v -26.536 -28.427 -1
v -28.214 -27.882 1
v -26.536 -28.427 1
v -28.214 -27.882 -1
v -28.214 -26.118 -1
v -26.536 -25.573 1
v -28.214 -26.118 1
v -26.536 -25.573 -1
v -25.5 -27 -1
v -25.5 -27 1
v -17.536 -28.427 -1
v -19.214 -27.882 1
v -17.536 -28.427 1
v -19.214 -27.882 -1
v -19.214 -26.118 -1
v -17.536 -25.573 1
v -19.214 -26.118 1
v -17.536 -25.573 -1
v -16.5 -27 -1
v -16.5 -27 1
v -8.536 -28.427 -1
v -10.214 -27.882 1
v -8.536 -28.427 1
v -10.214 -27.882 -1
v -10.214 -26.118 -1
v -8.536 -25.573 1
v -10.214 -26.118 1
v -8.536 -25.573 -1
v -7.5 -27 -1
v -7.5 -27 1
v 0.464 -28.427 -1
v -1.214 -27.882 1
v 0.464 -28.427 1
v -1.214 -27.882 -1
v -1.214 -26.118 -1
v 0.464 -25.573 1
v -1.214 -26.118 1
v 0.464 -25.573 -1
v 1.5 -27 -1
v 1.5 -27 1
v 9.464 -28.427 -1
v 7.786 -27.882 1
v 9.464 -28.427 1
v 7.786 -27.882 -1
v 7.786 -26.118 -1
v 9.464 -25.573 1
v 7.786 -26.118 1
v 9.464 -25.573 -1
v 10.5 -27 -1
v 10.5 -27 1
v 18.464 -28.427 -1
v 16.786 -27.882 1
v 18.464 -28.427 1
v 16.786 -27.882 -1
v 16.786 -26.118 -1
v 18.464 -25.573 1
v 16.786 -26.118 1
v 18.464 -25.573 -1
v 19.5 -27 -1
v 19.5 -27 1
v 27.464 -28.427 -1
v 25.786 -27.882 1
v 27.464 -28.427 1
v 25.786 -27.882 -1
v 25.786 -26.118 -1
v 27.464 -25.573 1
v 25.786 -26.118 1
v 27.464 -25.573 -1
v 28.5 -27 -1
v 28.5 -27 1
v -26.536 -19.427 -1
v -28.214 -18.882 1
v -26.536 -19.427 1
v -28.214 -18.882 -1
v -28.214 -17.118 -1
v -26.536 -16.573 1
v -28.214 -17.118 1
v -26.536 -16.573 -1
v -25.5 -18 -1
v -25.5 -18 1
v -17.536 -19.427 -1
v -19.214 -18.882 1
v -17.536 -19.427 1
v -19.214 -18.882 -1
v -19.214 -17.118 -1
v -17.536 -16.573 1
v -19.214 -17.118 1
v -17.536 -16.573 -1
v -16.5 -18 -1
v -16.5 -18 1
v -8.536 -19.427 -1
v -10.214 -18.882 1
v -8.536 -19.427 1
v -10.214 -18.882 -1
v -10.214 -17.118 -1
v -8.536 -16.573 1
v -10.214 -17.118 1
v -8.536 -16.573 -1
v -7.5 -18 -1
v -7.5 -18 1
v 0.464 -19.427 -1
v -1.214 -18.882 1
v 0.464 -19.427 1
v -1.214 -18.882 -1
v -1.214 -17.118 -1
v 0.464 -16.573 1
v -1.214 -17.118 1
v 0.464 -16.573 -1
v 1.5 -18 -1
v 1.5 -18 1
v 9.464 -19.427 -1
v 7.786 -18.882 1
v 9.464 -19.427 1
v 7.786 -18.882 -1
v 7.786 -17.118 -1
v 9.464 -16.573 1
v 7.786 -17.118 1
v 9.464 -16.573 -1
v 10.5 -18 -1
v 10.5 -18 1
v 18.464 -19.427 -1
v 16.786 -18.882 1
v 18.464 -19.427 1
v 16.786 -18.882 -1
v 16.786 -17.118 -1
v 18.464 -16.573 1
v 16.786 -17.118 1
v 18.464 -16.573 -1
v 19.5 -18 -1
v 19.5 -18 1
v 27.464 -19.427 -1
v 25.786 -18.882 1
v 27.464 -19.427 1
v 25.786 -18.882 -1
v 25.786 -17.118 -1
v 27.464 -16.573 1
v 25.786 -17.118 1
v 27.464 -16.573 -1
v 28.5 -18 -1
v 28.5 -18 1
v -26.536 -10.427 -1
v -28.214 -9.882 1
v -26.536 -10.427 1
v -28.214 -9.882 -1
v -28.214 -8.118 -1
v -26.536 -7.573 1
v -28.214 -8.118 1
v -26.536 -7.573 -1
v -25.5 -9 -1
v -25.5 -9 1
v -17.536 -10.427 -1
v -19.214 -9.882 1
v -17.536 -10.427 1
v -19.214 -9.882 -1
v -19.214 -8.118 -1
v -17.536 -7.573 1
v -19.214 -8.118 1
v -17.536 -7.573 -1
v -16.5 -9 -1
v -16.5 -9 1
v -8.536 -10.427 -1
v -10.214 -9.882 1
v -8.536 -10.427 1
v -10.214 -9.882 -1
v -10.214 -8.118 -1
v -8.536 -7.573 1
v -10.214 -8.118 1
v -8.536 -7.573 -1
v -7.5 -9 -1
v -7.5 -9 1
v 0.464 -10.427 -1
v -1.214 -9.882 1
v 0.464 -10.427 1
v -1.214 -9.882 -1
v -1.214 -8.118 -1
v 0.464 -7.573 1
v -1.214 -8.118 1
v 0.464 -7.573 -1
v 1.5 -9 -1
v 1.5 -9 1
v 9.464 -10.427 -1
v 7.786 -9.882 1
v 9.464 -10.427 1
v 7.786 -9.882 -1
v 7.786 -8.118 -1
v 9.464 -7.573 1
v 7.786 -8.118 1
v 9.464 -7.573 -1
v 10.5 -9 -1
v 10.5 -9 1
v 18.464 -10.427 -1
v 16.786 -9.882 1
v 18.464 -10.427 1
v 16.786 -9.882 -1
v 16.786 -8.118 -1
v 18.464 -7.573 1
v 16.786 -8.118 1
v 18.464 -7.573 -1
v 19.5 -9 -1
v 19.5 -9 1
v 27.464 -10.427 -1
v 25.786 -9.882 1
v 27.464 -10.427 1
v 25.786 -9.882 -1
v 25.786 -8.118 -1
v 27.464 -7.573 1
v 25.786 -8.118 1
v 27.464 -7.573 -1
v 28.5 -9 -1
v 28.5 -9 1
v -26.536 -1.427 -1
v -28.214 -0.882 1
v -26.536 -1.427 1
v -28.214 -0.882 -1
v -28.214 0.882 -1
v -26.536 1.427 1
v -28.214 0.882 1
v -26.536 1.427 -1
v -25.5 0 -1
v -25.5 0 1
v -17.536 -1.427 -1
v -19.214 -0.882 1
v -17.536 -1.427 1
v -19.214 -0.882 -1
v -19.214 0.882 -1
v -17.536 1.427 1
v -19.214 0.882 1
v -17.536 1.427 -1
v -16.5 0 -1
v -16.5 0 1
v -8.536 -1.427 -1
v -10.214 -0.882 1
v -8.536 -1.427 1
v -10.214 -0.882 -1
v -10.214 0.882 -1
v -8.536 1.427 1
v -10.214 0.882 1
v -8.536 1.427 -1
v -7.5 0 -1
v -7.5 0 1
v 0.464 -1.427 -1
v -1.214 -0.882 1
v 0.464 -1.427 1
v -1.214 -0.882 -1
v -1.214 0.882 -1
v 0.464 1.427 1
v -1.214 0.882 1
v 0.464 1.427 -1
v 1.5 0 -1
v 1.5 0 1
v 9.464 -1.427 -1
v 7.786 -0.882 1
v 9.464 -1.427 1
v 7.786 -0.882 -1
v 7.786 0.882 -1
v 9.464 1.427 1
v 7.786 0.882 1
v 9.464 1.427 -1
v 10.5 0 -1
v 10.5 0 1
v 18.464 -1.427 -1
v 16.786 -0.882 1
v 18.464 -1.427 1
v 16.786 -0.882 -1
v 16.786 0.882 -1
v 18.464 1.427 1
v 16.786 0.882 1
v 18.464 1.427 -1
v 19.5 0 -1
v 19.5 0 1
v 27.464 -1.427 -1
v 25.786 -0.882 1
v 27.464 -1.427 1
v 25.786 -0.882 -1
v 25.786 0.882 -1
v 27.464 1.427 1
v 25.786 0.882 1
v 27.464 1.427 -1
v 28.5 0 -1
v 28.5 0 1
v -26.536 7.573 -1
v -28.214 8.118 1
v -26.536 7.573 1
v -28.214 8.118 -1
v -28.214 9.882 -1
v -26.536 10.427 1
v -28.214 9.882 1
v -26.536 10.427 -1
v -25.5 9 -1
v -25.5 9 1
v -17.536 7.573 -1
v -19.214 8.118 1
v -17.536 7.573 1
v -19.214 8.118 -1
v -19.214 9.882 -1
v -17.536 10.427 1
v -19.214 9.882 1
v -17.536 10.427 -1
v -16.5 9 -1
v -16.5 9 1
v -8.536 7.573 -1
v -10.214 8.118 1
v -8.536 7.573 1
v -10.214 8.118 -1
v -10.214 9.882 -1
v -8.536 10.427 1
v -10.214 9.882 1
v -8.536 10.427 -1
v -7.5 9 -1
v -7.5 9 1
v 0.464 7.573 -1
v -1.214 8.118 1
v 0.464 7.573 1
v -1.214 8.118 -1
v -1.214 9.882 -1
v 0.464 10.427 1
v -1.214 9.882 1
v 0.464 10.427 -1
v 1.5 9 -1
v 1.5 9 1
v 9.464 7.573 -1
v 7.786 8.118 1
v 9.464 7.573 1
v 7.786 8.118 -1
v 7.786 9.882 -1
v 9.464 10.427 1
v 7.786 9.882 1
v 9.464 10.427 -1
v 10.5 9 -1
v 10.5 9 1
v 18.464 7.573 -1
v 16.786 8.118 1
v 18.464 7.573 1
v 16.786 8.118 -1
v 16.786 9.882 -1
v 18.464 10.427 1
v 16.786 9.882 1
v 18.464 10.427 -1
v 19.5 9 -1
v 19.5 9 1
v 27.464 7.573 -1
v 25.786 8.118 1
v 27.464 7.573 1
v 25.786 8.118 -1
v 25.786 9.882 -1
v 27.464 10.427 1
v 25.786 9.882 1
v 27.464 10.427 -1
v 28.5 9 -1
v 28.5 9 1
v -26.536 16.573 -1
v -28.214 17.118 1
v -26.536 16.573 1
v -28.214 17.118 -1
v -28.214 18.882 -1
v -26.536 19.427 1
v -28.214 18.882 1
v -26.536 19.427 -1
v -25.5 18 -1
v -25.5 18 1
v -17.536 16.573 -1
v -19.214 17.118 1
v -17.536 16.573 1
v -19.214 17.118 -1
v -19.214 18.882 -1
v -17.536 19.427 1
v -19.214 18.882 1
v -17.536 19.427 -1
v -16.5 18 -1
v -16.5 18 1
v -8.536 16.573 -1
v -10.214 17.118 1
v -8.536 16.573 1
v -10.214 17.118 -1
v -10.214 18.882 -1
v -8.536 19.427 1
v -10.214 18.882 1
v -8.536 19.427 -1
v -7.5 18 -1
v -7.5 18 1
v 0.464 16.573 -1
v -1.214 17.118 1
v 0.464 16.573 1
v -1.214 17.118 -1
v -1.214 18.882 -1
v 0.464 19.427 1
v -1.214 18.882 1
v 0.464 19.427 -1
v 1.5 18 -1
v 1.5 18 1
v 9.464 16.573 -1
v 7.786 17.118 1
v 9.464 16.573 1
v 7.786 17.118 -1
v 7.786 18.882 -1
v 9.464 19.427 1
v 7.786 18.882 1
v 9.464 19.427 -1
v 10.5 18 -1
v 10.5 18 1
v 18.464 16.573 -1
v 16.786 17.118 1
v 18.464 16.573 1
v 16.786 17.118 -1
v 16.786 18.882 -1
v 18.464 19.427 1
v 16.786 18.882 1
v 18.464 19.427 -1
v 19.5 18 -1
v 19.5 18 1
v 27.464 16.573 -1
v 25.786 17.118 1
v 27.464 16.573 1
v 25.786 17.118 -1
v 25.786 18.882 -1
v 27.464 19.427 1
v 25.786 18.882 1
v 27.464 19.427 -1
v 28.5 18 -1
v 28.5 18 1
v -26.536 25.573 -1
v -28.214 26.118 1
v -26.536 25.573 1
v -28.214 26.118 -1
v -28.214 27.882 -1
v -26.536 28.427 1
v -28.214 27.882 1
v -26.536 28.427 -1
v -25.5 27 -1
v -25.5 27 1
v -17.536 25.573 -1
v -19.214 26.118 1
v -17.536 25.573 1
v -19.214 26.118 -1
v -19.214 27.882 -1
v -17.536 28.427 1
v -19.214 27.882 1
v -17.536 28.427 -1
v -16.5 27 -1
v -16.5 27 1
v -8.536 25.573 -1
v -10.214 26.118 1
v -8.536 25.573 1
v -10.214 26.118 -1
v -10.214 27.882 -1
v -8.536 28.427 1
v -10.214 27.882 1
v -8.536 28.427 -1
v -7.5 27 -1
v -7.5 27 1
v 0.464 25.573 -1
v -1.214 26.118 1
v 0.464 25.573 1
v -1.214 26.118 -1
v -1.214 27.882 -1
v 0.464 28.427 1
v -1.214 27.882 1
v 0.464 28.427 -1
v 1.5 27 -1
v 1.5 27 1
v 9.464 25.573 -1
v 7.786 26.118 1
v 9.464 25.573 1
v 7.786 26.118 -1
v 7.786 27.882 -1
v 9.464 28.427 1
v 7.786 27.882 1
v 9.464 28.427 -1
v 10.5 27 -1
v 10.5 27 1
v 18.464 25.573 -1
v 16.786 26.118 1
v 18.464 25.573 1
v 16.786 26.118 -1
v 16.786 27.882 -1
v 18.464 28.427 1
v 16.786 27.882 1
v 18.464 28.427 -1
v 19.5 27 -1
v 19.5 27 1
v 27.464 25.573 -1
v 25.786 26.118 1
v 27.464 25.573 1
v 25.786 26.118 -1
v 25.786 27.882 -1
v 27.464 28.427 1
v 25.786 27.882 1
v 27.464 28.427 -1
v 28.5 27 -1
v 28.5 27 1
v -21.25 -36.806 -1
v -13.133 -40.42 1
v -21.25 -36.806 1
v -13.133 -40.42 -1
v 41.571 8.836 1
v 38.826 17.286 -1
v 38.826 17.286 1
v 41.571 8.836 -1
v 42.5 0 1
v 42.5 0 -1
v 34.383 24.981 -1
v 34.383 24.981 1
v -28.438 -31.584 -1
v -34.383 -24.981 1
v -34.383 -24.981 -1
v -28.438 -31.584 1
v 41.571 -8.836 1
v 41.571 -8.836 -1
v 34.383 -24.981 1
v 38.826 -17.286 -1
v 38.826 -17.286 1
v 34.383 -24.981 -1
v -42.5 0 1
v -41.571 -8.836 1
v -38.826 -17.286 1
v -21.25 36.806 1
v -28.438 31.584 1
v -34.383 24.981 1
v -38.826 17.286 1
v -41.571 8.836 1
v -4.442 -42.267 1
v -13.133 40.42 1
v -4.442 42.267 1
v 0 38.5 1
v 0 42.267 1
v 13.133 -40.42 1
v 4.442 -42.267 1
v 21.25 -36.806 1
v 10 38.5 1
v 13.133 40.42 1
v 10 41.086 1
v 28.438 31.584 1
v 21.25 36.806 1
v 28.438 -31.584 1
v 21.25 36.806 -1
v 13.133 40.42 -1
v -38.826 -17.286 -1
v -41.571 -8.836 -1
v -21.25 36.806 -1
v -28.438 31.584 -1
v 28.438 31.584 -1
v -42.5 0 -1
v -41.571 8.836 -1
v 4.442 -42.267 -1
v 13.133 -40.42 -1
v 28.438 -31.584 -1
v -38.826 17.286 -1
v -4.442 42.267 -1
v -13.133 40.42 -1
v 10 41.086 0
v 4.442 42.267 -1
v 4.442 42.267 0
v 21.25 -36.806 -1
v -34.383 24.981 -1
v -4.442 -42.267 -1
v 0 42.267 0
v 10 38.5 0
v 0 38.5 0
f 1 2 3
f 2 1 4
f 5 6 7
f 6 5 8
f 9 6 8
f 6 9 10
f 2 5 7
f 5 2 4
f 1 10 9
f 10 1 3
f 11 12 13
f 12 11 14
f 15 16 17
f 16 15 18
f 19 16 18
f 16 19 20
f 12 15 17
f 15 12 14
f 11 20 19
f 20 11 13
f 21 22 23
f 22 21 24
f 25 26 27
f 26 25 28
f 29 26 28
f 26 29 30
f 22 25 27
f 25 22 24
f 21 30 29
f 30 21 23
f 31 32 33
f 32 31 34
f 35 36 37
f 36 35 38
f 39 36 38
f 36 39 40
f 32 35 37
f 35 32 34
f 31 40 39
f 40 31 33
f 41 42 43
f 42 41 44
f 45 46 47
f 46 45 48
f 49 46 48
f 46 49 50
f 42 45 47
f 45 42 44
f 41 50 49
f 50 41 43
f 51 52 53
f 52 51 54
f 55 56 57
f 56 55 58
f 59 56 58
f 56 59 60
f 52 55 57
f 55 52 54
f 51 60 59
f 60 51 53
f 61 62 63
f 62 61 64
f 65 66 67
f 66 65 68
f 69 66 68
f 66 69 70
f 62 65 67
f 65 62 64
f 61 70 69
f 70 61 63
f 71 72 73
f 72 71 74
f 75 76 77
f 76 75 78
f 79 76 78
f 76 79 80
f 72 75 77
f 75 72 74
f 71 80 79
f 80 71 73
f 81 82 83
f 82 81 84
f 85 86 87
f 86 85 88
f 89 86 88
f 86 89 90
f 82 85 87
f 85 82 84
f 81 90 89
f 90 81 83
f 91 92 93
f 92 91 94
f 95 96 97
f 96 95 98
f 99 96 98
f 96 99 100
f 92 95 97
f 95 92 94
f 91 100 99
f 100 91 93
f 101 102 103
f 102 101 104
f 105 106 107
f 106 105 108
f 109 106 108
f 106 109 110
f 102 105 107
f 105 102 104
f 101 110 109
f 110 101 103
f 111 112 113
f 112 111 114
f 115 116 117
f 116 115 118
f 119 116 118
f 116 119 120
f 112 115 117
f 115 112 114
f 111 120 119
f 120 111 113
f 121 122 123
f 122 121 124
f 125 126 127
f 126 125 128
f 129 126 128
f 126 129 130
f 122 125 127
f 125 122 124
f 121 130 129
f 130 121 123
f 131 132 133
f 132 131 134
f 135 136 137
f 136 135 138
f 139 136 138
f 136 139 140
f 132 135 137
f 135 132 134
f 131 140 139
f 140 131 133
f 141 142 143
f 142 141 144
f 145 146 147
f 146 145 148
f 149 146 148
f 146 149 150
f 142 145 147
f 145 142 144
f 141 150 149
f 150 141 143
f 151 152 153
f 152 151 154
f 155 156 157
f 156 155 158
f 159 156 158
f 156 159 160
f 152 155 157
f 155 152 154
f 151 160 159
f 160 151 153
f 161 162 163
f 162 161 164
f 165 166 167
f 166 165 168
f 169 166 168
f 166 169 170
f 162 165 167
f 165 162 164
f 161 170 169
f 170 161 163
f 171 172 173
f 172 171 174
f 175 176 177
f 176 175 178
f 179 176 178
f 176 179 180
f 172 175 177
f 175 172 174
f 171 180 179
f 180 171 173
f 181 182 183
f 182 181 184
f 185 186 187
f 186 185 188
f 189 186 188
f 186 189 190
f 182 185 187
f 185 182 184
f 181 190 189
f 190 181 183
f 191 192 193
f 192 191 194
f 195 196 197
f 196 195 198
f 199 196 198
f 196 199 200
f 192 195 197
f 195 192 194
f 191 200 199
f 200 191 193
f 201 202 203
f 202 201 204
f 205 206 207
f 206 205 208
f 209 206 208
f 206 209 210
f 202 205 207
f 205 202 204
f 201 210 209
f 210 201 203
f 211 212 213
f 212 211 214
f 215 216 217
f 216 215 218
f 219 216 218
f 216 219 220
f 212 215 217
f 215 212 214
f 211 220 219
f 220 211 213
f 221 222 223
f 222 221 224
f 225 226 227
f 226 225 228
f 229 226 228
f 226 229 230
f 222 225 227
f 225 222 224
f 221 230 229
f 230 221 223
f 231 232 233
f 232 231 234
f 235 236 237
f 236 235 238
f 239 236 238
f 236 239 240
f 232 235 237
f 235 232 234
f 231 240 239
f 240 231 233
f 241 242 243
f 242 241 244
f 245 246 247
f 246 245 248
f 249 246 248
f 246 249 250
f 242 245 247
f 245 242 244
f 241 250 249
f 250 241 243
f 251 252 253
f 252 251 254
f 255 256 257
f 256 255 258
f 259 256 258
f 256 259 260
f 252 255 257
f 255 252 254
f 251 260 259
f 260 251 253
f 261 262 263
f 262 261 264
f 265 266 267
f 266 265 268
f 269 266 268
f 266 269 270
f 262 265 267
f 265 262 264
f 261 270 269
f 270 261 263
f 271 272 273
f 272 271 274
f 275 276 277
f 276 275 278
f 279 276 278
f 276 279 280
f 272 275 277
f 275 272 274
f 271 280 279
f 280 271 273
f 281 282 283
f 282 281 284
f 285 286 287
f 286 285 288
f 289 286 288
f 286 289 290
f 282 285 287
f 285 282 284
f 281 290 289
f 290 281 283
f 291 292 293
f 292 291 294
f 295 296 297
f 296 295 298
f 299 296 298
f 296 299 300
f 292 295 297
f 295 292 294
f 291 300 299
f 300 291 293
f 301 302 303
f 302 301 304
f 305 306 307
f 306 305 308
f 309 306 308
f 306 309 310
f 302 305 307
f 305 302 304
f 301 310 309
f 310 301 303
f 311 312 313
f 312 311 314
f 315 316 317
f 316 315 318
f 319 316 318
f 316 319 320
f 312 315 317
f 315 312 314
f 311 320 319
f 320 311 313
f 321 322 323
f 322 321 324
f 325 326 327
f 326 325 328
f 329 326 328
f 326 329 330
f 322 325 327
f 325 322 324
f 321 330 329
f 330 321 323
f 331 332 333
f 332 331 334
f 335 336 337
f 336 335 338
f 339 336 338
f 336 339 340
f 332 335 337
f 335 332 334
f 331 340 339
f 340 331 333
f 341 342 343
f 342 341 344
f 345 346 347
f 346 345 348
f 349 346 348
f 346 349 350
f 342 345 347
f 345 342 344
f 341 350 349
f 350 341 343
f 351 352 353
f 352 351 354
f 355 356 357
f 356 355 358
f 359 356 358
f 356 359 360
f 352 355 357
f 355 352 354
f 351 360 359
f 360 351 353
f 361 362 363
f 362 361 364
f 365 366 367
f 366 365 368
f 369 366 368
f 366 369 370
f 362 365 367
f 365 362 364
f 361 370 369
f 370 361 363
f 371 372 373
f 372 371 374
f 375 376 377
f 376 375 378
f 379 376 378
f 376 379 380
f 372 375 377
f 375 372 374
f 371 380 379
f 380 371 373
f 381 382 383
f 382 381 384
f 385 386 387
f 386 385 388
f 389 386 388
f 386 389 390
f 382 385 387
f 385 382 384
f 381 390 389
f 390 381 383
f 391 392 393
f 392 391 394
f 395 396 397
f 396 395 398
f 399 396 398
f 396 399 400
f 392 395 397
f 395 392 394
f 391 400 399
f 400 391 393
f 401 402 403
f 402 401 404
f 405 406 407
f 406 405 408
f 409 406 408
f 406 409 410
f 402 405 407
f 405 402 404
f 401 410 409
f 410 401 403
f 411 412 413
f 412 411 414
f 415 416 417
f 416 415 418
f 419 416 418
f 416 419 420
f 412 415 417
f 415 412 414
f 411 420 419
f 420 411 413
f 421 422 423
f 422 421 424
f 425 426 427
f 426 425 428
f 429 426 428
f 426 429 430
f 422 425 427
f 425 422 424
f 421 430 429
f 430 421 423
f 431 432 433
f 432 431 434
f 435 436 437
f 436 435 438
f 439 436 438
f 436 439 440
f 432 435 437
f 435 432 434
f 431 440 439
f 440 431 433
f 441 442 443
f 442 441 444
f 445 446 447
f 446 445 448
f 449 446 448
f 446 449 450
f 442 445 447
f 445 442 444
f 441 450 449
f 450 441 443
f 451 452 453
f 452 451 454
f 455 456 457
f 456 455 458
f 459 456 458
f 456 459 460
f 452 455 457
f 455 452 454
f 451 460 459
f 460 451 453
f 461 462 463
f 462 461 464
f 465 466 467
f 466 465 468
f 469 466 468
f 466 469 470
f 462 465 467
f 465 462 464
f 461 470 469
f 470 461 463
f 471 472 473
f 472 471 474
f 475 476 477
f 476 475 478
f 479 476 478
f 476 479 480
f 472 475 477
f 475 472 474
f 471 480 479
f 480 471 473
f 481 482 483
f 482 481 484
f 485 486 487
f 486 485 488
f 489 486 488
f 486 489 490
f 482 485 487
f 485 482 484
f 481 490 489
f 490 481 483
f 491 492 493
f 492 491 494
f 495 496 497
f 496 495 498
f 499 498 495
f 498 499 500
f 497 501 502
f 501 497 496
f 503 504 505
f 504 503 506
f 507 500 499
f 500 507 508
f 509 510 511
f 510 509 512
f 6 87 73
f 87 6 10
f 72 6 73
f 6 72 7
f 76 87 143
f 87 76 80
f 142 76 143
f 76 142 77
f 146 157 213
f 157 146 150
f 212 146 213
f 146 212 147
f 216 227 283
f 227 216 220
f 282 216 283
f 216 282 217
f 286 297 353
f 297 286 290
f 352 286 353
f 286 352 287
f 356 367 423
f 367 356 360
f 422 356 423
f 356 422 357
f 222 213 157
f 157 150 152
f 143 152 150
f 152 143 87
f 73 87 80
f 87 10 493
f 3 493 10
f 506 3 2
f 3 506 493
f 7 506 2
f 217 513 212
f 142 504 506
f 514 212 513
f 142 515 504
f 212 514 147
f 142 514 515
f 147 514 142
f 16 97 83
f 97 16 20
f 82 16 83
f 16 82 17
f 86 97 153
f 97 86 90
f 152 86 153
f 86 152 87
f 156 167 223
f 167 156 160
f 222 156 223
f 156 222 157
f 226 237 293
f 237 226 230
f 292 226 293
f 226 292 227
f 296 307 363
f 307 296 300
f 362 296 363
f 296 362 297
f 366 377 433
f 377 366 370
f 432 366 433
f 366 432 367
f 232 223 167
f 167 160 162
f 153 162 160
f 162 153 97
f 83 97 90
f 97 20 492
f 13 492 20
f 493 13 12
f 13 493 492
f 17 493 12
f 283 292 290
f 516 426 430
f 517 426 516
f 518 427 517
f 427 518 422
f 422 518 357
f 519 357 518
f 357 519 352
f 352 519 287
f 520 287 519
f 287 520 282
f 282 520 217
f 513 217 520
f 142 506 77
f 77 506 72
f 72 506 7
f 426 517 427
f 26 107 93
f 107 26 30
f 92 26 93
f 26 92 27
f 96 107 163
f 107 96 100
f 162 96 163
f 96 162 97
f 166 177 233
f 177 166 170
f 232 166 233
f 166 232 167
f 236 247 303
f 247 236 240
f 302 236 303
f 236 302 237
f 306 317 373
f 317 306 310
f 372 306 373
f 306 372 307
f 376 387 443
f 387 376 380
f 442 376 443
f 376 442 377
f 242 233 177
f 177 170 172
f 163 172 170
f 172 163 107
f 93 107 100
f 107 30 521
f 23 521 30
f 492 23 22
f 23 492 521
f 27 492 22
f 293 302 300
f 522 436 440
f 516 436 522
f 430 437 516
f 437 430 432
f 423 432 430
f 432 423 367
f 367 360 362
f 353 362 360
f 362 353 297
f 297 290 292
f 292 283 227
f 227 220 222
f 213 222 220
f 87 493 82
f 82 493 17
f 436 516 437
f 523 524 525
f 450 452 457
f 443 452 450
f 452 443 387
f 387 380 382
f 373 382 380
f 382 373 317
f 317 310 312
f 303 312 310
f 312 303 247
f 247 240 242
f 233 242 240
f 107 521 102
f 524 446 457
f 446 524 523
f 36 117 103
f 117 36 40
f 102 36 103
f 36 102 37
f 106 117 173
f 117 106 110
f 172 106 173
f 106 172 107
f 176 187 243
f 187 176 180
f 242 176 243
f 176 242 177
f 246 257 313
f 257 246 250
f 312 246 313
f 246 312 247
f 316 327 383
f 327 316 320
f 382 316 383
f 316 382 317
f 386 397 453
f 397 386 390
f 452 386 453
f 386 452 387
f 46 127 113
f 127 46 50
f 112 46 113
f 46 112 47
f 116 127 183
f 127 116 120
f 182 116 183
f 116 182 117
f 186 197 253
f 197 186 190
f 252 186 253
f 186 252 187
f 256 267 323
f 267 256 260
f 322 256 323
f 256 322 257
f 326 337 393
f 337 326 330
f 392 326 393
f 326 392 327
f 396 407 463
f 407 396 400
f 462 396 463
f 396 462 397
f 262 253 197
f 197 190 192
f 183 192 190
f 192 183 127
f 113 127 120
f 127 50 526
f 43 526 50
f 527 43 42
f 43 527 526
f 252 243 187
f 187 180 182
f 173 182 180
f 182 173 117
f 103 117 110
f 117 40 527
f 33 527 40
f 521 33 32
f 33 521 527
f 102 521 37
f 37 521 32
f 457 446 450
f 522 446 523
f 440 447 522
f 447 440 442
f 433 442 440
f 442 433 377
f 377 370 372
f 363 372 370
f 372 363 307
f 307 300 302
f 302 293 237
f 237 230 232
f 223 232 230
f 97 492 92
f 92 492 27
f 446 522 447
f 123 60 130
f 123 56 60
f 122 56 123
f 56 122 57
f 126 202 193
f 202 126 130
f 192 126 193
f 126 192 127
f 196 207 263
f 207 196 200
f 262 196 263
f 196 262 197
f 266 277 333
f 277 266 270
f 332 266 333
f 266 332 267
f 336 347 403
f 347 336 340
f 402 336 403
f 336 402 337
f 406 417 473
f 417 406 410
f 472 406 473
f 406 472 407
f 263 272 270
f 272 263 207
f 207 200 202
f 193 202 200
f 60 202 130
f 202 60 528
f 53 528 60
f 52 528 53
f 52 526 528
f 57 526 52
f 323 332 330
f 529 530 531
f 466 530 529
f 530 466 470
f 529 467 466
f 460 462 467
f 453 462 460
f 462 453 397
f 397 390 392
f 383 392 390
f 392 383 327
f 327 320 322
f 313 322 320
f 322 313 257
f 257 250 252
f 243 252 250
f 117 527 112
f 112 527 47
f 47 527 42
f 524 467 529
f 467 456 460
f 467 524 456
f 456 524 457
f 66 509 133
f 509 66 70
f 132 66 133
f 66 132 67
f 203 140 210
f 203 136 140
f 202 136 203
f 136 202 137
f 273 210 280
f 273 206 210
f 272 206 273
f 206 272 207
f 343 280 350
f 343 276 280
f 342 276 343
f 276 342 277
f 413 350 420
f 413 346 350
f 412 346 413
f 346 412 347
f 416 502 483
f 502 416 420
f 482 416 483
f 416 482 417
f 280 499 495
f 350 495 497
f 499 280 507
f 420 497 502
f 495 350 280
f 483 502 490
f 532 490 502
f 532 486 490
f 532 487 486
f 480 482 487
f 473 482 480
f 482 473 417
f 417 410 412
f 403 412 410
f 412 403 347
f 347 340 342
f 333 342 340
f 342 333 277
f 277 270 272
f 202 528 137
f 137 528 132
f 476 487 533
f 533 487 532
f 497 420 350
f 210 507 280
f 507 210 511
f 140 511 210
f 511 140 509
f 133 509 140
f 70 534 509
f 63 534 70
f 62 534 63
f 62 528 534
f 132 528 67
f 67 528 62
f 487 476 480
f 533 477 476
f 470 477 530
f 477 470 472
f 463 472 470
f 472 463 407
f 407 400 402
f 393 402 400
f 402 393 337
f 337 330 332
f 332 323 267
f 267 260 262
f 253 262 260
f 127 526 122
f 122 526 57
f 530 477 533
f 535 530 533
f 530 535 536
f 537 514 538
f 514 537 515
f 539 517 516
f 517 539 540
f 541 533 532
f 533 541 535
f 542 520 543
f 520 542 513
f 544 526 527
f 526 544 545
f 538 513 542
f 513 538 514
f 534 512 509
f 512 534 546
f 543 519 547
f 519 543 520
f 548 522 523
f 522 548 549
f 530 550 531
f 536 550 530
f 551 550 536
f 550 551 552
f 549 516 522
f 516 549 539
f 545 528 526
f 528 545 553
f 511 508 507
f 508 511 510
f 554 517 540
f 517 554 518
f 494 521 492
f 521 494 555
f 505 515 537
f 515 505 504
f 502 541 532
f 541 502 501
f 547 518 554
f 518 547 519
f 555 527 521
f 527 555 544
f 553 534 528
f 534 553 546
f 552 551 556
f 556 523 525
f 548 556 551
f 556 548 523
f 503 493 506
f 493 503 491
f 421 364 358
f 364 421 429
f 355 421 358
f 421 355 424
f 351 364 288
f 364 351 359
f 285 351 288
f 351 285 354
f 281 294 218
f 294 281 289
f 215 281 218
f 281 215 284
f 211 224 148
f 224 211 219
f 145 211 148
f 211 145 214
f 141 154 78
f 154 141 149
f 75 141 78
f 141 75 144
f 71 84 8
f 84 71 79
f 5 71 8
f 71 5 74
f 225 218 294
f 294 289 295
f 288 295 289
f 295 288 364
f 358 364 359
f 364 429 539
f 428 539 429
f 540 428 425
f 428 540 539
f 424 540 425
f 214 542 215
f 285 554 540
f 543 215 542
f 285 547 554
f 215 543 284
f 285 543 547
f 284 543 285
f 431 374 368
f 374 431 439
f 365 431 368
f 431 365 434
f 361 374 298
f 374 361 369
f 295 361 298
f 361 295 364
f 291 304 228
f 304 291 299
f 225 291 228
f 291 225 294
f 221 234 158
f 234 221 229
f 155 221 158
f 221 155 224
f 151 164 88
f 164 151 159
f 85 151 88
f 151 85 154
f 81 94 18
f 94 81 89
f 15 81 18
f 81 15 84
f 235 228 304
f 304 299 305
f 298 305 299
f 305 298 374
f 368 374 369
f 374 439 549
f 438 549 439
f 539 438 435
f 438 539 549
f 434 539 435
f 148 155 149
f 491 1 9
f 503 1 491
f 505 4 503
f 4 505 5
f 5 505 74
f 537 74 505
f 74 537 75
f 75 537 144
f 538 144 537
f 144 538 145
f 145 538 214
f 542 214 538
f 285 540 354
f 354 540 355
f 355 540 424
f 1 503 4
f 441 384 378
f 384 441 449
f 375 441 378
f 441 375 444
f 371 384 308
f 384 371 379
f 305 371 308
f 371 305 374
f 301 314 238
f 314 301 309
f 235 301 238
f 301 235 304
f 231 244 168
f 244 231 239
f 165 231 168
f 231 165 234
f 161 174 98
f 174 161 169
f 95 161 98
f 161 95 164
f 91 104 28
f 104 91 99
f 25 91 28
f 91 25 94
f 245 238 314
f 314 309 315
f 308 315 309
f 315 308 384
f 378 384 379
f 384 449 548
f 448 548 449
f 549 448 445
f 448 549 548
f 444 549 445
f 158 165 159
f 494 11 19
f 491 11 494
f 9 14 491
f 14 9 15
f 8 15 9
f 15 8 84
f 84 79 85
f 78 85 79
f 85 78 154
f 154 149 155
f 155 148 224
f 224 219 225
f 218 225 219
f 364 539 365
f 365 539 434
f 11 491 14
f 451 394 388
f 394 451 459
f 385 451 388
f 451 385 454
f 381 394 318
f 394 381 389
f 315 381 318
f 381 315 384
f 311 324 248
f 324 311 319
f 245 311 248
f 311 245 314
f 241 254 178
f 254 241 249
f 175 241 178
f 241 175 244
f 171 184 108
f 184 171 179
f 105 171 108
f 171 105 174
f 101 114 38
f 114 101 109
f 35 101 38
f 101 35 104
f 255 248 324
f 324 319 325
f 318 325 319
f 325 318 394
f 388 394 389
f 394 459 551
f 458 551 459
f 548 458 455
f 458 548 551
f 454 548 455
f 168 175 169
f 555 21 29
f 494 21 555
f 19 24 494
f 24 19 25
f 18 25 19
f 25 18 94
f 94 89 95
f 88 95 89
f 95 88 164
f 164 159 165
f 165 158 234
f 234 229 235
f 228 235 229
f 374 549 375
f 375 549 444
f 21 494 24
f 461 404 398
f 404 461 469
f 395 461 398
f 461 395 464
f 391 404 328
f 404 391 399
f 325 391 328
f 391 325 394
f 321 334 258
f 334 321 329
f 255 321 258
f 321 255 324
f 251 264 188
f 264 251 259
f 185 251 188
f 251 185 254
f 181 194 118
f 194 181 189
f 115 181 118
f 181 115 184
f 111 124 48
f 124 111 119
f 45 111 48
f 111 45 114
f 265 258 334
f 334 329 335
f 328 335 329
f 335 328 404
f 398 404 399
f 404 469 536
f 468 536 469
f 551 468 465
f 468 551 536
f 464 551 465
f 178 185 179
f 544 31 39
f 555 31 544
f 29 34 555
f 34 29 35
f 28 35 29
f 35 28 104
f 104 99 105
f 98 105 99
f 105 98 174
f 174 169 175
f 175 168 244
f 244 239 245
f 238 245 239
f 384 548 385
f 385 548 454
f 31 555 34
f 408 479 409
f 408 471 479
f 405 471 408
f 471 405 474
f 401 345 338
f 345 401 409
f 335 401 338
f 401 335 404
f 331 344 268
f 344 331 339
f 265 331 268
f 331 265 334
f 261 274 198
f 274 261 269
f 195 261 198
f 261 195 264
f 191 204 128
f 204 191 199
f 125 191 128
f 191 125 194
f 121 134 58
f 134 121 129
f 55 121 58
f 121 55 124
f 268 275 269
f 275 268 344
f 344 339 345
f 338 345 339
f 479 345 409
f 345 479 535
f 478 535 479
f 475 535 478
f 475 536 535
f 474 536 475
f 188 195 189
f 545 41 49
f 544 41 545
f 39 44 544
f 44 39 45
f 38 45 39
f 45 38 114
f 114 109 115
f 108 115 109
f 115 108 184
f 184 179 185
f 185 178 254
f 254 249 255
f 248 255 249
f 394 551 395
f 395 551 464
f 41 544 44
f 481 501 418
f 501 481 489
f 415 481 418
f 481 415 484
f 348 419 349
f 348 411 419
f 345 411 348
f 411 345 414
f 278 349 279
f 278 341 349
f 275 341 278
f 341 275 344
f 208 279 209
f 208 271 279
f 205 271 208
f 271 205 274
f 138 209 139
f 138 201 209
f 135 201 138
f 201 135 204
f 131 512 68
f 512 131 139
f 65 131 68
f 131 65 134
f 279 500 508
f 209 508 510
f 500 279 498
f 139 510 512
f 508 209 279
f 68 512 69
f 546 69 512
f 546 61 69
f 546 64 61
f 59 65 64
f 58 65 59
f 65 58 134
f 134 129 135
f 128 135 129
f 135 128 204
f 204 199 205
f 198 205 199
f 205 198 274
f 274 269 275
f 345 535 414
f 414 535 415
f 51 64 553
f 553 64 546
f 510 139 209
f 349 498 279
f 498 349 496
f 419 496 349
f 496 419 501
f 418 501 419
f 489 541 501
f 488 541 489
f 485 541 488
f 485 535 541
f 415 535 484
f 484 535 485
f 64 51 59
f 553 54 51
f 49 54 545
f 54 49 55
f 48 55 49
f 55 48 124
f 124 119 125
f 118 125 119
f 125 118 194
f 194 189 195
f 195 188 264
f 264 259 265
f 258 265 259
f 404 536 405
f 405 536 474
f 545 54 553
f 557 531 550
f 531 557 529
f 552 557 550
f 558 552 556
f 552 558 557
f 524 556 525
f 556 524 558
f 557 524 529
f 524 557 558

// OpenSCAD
// Sowing Template for 90mm Petri Dish
// Designed to sit flat on the XY plane (Z=0)

// --- Dimensions ---
// Disc outer diameter
D_OUTER = 85;
// Disc thickness
T_THICK = 2;
// Grid configuration
GRID_ROWS = 7;
GRID_COLS = 7;
// Hole diameter
D_HOLE = 3;
// Hole spacing (center-to-center)
S_SPACING = 9;
// Notch dimensions
N_WIDTH = 10;   // Width in X
N_DEPTH = 4;    // Depth in Y (from rim)
// Orientation notch location: +Y side, centered on Y axis

// --- Derived Dimensions ---
// Radius of the disc
R_OUTER = D_OUTER / 2;
// Radius of the hole
R_HOLE = D_HOLE / 2;
// Radius of the notch cut (half width)
R_NOTCH_X = N_WIDTH / 2;
// Y position of the notch start (Rim radius - Notch depth)
Y_NOTCH_START = R_OUTER - N_DEPTH;

// --- Main Body ---
// Create the flat disc
difference() {
    // Main disc cylinder
    cylinder(
        h = T_THICK,
        r = R_OUTER,
        center = true
    );
    
    // --- Cut Holes ---
    // Loop to create the 7x7 grid of holes
    for (y = [-(GRID_ROWS-1)/2 : 1 : (GRID_ROWS-1)/2]) {
        for (x = [-(GRID_COLS-1)/2 : 1 : (GRID_COLS-1)/2]) {
            translate([x * S_SPACING, y * S_SPACING, 0]) {
                // Extend slightly past the face to ensure clean cut
                cylinder(
                    h = T_THICK + 0.1, 
                    r = R_HOLE,
                    center = true
                );
            }
        }
    }
    
    // --- Cut Orientation Notch ---
    // The notch is on the +Y side, centered on the Y axis.
    // It cuts into the rim.
    // We define a rectangular prism that intersects the cylinder.
    // The notch is 10mm wide (X) and 4mm deep (Y).
    // Position: Centered at X=0. Starts at Y = R_OUTER - N_DEPTH.
    translate([0, Y_NOTCH_START, 0]) {
        // The cut shape needs to extend slightly past the Z=0 and Z=T_THICK faces
        // to ensure the cut goes all the way through.
        cube([
            N_WIDTH,      // X size
            N_DEPTH,      // Y size
            T_THICK + 0.1 // Z size (extends slightly past top and bottom)
        ]);
    }
}
